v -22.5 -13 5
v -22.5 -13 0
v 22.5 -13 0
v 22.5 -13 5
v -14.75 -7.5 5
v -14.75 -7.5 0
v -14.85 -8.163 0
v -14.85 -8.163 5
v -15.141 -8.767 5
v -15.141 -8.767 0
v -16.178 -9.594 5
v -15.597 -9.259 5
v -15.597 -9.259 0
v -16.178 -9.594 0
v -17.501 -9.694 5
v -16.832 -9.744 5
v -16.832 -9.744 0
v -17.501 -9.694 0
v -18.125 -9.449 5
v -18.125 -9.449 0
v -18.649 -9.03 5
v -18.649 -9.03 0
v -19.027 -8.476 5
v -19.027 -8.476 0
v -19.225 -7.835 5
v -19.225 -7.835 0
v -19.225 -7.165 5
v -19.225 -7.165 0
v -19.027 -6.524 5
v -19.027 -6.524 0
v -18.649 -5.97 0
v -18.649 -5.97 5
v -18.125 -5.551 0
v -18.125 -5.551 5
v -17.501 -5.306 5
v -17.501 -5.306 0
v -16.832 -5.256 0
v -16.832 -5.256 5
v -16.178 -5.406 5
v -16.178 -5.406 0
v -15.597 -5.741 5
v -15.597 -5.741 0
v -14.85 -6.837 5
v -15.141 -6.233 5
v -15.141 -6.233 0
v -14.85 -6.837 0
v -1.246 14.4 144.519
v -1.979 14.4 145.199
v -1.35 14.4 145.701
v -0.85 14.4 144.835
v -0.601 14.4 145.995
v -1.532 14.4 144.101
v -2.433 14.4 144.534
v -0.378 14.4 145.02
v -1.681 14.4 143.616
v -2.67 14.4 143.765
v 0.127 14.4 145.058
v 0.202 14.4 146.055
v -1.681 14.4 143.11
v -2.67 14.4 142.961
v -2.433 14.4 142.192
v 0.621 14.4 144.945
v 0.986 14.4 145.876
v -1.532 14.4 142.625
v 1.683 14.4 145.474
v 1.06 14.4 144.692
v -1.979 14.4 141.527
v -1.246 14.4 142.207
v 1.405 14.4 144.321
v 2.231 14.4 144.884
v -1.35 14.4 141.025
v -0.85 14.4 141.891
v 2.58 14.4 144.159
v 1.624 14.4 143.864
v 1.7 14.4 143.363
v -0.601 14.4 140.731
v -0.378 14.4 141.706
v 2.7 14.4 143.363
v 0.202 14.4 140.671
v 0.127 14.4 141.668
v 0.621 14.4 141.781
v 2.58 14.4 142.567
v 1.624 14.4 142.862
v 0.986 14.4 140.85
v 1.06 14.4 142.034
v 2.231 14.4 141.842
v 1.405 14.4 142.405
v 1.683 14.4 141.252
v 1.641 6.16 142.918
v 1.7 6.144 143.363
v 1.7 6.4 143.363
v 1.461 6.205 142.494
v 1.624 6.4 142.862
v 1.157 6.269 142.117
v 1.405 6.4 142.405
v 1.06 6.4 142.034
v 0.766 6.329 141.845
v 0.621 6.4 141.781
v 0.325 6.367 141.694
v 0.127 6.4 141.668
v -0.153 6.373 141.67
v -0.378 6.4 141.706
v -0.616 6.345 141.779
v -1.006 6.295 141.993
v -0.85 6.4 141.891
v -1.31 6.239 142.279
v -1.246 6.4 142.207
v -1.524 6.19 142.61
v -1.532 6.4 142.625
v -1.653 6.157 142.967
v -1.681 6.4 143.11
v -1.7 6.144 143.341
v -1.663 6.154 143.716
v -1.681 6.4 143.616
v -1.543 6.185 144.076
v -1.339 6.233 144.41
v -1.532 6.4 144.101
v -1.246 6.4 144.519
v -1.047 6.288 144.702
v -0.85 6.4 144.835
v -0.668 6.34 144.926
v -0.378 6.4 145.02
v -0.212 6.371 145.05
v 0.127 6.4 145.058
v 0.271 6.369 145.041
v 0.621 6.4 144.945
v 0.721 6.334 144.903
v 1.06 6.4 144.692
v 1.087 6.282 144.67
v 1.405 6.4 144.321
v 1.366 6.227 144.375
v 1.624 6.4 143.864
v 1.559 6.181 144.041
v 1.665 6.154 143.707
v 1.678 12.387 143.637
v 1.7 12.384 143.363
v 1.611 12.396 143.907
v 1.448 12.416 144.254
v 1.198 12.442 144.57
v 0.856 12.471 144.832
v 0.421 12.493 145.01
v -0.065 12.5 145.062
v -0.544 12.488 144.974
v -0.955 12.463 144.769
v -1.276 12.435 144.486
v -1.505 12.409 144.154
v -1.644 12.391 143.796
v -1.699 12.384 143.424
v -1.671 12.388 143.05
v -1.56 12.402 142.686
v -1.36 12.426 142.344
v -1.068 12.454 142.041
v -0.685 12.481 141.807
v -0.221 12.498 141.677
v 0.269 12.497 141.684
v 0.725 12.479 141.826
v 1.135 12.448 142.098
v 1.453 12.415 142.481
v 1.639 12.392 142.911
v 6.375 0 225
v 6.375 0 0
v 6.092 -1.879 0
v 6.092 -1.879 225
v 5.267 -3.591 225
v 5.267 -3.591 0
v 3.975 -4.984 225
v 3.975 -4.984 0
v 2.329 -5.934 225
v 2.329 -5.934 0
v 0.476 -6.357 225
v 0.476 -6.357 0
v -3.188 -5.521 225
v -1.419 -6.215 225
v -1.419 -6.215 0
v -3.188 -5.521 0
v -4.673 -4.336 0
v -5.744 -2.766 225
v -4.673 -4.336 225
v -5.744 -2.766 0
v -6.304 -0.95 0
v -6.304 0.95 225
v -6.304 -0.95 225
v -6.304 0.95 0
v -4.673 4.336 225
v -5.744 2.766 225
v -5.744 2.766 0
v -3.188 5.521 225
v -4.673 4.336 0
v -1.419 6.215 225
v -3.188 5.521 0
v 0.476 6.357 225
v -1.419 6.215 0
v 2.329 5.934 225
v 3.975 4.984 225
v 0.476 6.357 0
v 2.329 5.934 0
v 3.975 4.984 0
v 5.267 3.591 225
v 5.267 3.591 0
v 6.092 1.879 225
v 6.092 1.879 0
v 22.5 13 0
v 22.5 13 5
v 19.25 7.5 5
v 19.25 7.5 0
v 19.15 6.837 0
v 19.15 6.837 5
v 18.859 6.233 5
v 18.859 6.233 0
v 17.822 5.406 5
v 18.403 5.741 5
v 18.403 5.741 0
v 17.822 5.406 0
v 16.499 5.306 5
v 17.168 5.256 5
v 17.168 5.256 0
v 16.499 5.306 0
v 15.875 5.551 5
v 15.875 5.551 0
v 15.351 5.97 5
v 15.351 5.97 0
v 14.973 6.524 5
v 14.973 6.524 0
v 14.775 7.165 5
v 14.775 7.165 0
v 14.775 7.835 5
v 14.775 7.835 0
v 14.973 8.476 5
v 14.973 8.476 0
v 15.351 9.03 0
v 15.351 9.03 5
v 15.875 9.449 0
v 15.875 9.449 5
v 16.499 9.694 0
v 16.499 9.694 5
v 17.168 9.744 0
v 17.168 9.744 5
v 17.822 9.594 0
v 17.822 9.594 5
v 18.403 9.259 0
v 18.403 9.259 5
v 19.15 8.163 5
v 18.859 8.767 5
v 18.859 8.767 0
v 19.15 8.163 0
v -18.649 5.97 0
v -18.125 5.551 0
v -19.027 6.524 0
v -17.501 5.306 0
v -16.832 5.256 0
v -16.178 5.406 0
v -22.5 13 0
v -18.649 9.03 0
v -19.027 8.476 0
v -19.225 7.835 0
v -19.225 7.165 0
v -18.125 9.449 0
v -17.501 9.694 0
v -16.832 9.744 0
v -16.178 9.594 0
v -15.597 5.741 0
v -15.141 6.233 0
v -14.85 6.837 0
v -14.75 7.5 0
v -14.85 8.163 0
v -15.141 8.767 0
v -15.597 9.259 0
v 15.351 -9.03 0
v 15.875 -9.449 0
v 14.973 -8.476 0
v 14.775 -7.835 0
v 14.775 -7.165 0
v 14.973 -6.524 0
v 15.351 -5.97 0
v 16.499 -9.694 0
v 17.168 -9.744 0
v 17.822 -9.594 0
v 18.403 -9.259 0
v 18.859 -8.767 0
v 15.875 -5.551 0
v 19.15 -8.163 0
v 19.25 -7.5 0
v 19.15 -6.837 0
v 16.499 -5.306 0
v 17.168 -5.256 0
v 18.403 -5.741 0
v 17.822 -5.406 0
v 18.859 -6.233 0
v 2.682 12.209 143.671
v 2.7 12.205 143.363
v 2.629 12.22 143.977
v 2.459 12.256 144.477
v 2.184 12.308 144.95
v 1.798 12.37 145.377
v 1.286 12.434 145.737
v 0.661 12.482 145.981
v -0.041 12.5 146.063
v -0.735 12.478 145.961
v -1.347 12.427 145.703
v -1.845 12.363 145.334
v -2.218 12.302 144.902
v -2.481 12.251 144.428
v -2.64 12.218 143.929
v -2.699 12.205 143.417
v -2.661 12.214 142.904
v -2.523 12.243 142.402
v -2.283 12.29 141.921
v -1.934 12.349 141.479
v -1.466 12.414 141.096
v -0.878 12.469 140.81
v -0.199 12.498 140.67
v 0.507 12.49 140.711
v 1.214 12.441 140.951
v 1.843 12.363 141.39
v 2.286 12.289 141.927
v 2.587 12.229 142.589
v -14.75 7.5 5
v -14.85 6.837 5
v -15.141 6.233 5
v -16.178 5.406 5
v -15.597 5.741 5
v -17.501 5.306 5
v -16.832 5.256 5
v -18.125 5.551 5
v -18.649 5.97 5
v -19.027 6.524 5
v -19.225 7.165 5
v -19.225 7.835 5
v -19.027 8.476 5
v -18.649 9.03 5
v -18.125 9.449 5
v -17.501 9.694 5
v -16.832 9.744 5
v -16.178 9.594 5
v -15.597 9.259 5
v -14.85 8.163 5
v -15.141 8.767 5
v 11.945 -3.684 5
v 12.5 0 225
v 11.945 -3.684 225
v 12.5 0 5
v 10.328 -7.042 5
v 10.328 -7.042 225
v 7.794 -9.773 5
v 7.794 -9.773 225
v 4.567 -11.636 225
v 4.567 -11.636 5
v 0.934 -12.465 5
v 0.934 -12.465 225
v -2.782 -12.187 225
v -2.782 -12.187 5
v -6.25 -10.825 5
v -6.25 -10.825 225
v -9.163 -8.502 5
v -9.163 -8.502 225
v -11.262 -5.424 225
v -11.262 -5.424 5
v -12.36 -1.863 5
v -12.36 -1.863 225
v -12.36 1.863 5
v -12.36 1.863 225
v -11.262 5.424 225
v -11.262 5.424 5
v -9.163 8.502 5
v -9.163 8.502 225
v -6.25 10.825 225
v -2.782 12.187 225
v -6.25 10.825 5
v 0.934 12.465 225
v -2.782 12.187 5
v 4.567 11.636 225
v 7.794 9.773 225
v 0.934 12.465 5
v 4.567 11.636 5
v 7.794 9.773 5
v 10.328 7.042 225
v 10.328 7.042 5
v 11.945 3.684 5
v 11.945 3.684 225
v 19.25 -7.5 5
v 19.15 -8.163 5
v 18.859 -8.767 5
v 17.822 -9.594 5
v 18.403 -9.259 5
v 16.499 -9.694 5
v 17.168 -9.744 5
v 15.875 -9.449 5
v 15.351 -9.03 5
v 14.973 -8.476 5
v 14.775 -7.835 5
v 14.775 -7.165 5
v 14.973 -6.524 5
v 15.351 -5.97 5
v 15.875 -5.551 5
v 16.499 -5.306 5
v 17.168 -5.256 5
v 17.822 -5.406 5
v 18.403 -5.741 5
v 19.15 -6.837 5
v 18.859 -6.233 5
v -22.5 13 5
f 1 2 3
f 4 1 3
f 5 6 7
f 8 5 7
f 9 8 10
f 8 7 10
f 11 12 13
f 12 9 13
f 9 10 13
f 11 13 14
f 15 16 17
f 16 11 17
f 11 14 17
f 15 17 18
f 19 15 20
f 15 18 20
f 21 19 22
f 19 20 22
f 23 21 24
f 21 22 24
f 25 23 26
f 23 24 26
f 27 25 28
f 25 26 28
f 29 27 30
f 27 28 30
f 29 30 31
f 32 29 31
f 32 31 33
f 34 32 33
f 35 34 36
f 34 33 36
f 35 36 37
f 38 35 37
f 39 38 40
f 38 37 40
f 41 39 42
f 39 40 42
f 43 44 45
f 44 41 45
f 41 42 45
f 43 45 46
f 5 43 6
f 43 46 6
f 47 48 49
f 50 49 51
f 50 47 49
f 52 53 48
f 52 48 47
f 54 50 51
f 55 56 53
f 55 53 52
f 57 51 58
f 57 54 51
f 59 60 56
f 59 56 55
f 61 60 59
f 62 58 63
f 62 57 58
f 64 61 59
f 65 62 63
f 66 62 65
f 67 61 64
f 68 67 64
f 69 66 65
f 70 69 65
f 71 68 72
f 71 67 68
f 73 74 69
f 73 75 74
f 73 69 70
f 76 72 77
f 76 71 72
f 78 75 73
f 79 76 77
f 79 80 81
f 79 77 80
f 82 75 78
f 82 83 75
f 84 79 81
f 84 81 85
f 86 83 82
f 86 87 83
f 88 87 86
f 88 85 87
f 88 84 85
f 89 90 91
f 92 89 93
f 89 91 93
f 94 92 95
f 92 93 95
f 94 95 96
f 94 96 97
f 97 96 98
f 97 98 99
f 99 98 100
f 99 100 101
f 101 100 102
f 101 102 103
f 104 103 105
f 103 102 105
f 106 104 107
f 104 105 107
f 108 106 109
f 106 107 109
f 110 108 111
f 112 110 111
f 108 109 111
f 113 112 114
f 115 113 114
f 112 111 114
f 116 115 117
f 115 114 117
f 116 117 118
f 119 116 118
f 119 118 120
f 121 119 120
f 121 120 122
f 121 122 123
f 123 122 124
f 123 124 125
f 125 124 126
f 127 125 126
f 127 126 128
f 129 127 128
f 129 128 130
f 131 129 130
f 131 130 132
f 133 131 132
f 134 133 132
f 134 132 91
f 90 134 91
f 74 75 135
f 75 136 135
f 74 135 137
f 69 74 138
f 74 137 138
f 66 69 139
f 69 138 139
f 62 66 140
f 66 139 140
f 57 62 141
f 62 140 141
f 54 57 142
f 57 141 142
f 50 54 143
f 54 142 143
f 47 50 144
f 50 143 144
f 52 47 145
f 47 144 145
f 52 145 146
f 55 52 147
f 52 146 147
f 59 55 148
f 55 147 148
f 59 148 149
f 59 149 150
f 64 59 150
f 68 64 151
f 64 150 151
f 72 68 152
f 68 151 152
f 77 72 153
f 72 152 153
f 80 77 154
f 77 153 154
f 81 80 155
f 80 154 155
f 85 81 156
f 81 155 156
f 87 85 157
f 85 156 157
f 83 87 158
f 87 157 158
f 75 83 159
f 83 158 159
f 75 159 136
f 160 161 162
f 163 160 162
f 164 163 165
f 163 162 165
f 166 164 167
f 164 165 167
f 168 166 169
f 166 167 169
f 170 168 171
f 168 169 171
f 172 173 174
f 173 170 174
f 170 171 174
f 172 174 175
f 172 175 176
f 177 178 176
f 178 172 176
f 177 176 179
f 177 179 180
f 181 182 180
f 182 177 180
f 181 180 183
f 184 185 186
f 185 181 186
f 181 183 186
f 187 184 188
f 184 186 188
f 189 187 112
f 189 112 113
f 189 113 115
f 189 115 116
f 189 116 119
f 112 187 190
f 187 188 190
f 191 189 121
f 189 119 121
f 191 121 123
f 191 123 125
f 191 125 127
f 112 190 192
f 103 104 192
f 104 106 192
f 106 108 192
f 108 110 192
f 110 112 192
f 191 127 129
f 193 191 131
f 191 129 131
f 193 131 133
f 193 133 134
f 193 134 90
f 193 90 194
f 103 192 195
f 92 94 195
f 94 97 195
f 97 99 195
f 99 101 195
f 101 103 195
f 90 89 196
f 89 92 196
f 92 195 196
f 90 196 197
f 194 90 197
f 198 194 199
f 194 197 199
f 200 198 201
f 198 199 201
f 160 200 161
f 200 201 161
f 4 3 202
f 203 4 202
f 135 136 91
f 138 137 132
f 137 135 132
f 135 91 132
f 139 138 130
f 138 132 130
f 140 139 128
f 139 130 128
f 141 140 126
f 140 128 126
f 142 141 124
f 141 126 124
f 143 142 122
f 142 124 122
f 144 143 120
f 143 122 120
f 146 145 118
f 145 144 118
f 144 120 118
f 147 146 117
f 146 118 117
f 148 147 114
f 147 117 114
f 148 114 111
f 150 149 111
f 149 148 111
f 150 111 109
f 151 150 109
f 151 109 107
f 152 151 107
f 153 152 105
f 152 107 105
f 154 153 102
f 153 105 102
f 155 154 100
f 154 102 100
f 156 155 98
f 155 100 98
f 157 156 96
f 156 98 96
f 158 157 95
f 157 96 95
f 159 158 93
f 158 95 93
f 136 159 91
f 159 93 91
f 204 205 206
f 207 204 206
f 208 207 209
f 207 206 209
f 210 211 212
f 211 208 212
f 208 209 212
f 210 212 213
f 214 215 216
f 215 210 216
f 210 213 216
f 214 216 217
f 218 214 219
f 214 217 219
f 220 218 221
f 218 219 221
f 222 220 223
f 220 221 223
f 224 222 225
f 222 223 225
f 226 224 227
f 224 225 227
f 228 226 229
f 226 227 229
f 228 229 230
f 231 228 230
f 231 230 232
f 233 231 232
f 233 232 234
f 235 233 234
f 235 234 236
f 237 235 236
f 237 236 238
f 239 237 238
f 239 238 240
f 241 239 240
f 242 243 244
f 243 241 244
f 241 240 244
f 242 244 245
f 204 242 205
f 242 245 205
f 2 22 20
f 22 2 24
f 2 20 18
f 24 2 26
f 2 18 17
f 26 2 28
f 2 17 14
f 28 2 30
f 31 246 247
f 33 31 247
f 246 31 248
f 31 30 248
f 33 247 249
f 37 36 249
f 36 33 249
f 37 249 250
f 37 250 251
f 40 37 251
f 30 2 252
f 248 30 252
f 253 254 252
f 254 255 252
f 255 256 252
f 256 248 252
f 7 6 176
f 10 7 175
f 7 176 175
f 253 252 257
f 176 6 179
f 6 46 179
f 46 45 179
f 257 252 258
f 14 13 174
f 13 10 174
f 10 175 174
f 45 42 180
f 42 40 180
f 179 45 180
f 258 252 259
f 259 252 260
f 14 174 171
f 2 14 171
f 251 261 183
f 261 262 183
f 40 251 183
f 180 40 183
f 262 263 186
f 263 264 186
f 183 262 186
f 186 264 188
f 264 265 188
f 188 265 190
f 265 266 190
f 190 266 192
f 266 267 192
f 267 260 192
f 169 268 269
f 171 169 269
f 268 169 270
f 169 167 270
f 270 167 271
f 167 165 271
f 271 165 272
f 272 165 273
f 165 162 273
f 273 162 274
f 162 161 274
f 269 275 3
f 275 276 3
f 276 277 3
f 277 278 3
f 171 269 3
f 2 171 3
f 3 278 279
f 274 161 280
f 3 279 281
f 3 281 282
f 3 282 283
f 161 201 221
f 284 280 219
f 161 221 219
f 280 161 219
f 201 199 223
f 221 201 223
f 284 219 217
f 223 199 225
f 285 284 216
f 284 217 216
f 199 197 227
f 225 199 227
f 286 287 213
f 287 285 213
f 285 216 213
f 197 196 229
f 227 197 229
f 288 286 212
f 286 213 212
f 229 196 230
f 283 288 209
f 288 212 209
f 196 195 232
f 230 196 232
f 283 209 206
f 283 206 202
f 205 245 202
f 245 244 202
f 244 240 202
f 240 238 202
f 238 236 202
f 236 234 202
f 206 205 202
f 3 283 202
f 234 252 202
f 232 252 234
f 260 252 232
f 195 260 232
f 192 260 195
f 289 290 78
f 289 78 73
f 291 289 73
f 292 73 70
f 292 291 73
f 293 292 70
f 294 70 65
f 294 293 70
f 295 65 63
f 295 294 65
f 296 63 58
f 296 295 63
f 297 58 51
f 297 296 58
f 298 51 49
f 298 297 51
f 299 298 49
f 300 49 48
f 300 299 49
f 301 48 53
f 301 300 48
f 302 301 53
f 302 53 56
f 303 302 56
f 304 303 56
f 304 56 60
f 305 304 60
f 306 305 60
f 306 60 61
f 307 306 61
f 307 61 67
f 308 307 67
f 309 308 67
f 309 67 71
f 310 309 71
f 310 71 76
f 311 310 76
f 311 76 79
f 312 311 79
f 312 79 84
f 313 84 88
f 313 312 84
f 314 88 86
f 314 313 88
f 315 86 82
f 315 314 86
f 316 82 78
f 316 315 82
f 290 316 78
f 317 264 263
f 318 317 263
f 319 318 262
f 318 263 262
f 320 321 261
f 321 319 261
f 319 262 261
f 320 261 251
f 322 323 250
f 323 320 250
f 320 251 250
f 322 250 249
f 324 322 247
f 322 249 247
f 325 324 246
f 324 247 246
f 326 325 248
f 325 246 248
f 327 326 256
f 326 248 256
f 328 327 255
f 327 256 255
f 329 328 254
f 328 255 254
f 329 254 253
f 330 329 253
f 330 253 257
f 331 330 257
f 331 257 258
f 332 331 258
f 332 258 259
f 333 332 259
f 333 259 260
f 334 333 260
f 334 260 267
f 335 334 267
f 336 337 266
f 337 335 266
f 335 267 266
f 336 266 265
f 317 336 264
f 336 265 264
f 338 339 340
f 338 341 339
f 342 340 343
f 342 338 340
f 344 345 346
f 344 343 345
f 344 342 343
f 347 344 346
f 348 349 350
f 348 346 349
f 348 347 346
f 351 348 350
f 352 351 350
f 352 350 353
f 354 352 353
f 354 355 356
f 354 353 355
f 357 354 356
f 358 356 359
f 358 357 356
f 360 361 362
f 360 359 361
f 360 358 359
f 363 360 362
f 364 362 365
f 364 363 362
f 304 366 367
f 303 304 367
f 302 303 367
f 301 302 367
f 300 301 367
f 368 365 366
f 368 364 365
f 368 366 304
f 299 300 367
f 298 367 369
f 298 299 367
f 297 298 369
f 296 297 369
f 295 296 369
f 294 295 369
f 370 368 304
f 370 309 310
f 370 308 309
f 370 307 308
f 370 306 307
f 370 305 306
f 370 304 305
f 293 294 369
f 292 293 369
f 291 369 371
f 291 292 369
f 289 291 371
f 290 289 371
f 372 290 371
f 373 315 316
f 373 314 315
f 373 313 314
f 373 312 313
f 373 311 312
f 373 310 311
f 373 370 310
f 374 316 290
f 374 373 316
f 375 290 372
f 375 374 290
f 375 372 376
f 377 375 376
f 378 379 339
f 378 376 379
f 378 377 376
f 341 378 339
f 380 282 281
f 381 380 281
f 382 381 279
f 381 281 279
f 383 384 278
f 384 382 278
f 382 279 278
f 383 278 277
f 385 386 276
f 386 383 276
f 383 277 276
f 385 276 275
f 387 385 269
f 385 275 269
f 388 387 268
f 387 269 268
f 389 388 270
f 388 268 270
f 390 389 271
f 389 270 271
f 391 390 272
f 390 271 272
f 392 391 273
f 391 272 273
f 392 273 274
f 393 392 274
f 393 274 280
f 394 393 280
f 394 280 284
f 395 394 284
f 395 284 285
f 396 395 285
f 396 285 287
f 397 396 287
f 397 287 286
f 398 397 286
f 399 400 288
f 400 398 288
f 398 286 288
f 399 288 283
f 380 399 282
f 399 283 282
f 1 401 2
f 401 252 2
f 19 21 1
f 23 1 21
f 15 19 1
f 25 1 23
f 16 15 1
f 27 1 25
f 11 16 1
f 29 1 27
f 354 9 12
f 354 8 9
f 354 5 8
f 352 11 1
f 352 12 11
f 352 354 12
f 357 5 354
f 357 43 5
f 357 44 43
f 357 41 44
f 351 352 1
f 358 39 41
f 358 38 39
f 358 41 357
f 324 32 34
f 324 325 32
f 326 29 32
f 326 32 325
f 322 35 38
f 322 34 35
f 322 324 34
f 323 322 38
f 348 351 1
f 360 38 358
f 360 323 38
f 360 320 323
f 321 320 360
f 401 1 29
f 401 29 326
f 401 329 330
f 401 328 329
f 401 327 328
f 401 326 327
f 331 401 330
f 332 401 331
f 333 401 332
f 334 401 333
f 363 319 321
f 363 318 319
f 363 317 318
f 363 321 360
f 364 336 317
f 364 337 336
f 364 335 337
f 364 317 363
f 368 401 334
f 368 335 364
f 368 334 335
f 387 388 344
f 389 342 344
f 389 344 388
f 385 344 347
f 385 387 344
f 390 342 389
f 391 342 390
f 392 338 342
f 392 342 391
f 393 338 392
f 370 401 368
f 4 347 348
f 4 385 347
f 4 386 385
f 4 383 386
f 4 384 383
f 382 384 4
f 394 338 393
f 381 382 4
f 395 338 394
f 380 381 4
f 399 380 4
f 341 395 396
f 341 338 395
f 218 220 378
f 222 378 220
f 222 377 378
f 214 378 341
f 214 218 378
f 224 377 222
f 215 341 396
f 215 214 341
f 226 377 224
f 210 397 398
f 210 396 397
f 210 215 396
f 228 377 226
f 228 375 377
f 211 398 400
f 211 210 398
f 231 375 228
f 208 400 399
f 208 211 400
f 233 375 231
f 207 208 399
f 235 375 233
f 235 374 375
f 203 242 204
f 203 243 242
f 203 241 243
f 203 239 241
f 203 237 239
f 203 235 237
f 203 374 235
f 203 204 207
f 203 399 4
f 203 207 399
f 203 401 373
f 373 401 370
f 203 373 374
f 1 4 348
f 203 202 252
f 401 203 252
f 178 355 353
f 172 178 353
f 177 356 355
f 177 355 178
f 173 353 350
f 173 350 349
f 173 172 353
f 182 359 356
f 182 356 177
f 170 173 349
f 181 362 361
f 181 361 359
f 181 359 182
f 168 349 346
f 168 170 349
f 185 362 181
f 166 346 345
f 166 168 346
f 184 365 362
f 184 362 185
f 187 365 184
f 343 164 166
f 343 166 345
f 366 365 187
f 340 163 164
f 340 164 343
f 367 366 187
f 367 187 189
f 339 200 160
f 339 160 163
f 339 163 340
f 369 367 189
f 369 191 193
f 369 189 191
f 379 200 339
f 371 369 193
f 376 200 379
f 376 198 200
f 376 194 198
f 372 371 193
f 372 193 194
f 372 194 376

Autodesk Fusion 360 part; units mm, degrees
sketch "Sketch1" plane through (0, 0, 0) normal (0, 0, 1) x (1, 0, 0)
  circle A0 centre (0, 0) radius 6.375
  circle A1 centre (0, 0) radius 12.5
  dimension "d1" = 25
  dimension "d2" = 12.75
extrude "Extrude1" add sketch "Sketch1" along normal blind 225 contours A0 | A1
extrude "Extrude19" cut sketch "Sketch1" along normal up to surface (225 mm away) contours A0
sketch "Sketch22" plane through (0, 0, 0) normal (0, 0, 1) x (1, 0, 0)
  line L0 (22.5, 13) -> (-22.5, 13)
  line L1 (-22.5, 13) -> (-22.5, -13)
  line L2 (-22.5, -13) -> (22.5, -13)
  line L3 (22.5, -13) -> (22.5, 13)
  circle A0 centre (0, 0) radius 6.375 construction
  circle A1 centre (0, 0) radius 12.5 construction
  line L4 (0, 0) -> (22.5, 0) construction
  line L5 (0, 0) -> (-22.5, 0) construction
  circle A2 centre (0, 0) radius 12.5
  circle A3 centre (17, 7.5) radius 2.25
  circle A4 centre (-17, 7.5) radius 2.25
  circle A5 centre (-17, -7.5) radius 2.25
  circle A6 centre (17, -7.5) radius 2.25
  point P0 (12.5, 0)
  point P1 (-12.5, 0)
  dimension "d150" = 10
  dimension "d151" = 10
  dimension "d152" = 13
  dimension "d155" = 4.5
  dimension "d156" = 17
  dimension "d157" = 17
  dimension "d158" = 17
  dimension "d159" = 17
  dimension "d160" = 4.5
  dimension "d161" = 4.5
  dimension "d162" = 4.5
  dimension "d163" = 7.5
  dimension "d164" = 7.5
  dimension "d165" = 7.5
  dimension "d166" = 7.5
extrude "Mount Holes" add sketch "Sketch22" along normal blind 5
ref_plane "WorkPlane4" through (0, 6.4, 0) normal (0, 1, 0) x (0, 0, 1)
sketch "Sketch21" plane through (0, 6.4, 0) normal (0, 1, 0) x (1, 0, 0)
  circle A0 centre (0, -143.363) radius 1.7
  circle A1 centre (0, -143.363) radius 2.7
  line L0 (-12.5, -225) -> (12.5, -225)
  line L1 (22.5, 0) -> (-22.5, 0) construction
  line L2 (-22.5, 0) -> (-22.5, -5) construction
  line L3 (-22.5, -5) -> (22.5, -5) construction
  line L4 (22.5, -5) -> (22.5, 0) construction
  line L5 (0, -5) -> (0, -225) construction
  dimension "d137" = 3.4
  dimension "d138" = 5.4
  dimension "d167" = 81.637
extrude "Extrude17" add sketch "Sketch21" along normal blind 8
extrude "Extrude18" cut sketch "Sketch21" along normal blind 8 and the other way blind 2 contours A0
equation "d5 = 12.8 mm"
equation "d20 = 0.105 in"
equation "d22 = d20"
equation "d29 = 2.5 in"
equation "d129 = 7.5 mm"
equation "d136 = d5 / 2"
equation "d138 = d137 + 2 mm"
equation "d151 = d150"
equation "d157 = d156"
equation "d158 = d156"
equation "d159 = d156"
equation "d160 = d155"
equation "d161 = d155"
equation "d162 = d155"
equation "d164 = d163"
equation "d165 = d163"
equation "d166 = d163"
equation "d50 = d48 / 2"
equation "d51 = d50"
equation "d52 = d53"
equation "d53 = d46 / 2"
equation "d54 = 4.25 mm"
equation "d55 = d54"
equation "d56 = -d45"
equation "d58 = 4.5 mm"
equation "d59 = d58"
equation "d64 = d67"
equation "d67 = 154.736 mm"
equation "d70 = d67"
equation "d110 = d26 / 2"
equation "d111 = d16 / 2"
equation "d115 = -d29"
equation "d119 = -d29"
equation "d127 = 17 mm"
equation "d128 = d127"
equation "d130 = d129"
equation "d131 = 4.25 mm"
equation "d132 = d131"
